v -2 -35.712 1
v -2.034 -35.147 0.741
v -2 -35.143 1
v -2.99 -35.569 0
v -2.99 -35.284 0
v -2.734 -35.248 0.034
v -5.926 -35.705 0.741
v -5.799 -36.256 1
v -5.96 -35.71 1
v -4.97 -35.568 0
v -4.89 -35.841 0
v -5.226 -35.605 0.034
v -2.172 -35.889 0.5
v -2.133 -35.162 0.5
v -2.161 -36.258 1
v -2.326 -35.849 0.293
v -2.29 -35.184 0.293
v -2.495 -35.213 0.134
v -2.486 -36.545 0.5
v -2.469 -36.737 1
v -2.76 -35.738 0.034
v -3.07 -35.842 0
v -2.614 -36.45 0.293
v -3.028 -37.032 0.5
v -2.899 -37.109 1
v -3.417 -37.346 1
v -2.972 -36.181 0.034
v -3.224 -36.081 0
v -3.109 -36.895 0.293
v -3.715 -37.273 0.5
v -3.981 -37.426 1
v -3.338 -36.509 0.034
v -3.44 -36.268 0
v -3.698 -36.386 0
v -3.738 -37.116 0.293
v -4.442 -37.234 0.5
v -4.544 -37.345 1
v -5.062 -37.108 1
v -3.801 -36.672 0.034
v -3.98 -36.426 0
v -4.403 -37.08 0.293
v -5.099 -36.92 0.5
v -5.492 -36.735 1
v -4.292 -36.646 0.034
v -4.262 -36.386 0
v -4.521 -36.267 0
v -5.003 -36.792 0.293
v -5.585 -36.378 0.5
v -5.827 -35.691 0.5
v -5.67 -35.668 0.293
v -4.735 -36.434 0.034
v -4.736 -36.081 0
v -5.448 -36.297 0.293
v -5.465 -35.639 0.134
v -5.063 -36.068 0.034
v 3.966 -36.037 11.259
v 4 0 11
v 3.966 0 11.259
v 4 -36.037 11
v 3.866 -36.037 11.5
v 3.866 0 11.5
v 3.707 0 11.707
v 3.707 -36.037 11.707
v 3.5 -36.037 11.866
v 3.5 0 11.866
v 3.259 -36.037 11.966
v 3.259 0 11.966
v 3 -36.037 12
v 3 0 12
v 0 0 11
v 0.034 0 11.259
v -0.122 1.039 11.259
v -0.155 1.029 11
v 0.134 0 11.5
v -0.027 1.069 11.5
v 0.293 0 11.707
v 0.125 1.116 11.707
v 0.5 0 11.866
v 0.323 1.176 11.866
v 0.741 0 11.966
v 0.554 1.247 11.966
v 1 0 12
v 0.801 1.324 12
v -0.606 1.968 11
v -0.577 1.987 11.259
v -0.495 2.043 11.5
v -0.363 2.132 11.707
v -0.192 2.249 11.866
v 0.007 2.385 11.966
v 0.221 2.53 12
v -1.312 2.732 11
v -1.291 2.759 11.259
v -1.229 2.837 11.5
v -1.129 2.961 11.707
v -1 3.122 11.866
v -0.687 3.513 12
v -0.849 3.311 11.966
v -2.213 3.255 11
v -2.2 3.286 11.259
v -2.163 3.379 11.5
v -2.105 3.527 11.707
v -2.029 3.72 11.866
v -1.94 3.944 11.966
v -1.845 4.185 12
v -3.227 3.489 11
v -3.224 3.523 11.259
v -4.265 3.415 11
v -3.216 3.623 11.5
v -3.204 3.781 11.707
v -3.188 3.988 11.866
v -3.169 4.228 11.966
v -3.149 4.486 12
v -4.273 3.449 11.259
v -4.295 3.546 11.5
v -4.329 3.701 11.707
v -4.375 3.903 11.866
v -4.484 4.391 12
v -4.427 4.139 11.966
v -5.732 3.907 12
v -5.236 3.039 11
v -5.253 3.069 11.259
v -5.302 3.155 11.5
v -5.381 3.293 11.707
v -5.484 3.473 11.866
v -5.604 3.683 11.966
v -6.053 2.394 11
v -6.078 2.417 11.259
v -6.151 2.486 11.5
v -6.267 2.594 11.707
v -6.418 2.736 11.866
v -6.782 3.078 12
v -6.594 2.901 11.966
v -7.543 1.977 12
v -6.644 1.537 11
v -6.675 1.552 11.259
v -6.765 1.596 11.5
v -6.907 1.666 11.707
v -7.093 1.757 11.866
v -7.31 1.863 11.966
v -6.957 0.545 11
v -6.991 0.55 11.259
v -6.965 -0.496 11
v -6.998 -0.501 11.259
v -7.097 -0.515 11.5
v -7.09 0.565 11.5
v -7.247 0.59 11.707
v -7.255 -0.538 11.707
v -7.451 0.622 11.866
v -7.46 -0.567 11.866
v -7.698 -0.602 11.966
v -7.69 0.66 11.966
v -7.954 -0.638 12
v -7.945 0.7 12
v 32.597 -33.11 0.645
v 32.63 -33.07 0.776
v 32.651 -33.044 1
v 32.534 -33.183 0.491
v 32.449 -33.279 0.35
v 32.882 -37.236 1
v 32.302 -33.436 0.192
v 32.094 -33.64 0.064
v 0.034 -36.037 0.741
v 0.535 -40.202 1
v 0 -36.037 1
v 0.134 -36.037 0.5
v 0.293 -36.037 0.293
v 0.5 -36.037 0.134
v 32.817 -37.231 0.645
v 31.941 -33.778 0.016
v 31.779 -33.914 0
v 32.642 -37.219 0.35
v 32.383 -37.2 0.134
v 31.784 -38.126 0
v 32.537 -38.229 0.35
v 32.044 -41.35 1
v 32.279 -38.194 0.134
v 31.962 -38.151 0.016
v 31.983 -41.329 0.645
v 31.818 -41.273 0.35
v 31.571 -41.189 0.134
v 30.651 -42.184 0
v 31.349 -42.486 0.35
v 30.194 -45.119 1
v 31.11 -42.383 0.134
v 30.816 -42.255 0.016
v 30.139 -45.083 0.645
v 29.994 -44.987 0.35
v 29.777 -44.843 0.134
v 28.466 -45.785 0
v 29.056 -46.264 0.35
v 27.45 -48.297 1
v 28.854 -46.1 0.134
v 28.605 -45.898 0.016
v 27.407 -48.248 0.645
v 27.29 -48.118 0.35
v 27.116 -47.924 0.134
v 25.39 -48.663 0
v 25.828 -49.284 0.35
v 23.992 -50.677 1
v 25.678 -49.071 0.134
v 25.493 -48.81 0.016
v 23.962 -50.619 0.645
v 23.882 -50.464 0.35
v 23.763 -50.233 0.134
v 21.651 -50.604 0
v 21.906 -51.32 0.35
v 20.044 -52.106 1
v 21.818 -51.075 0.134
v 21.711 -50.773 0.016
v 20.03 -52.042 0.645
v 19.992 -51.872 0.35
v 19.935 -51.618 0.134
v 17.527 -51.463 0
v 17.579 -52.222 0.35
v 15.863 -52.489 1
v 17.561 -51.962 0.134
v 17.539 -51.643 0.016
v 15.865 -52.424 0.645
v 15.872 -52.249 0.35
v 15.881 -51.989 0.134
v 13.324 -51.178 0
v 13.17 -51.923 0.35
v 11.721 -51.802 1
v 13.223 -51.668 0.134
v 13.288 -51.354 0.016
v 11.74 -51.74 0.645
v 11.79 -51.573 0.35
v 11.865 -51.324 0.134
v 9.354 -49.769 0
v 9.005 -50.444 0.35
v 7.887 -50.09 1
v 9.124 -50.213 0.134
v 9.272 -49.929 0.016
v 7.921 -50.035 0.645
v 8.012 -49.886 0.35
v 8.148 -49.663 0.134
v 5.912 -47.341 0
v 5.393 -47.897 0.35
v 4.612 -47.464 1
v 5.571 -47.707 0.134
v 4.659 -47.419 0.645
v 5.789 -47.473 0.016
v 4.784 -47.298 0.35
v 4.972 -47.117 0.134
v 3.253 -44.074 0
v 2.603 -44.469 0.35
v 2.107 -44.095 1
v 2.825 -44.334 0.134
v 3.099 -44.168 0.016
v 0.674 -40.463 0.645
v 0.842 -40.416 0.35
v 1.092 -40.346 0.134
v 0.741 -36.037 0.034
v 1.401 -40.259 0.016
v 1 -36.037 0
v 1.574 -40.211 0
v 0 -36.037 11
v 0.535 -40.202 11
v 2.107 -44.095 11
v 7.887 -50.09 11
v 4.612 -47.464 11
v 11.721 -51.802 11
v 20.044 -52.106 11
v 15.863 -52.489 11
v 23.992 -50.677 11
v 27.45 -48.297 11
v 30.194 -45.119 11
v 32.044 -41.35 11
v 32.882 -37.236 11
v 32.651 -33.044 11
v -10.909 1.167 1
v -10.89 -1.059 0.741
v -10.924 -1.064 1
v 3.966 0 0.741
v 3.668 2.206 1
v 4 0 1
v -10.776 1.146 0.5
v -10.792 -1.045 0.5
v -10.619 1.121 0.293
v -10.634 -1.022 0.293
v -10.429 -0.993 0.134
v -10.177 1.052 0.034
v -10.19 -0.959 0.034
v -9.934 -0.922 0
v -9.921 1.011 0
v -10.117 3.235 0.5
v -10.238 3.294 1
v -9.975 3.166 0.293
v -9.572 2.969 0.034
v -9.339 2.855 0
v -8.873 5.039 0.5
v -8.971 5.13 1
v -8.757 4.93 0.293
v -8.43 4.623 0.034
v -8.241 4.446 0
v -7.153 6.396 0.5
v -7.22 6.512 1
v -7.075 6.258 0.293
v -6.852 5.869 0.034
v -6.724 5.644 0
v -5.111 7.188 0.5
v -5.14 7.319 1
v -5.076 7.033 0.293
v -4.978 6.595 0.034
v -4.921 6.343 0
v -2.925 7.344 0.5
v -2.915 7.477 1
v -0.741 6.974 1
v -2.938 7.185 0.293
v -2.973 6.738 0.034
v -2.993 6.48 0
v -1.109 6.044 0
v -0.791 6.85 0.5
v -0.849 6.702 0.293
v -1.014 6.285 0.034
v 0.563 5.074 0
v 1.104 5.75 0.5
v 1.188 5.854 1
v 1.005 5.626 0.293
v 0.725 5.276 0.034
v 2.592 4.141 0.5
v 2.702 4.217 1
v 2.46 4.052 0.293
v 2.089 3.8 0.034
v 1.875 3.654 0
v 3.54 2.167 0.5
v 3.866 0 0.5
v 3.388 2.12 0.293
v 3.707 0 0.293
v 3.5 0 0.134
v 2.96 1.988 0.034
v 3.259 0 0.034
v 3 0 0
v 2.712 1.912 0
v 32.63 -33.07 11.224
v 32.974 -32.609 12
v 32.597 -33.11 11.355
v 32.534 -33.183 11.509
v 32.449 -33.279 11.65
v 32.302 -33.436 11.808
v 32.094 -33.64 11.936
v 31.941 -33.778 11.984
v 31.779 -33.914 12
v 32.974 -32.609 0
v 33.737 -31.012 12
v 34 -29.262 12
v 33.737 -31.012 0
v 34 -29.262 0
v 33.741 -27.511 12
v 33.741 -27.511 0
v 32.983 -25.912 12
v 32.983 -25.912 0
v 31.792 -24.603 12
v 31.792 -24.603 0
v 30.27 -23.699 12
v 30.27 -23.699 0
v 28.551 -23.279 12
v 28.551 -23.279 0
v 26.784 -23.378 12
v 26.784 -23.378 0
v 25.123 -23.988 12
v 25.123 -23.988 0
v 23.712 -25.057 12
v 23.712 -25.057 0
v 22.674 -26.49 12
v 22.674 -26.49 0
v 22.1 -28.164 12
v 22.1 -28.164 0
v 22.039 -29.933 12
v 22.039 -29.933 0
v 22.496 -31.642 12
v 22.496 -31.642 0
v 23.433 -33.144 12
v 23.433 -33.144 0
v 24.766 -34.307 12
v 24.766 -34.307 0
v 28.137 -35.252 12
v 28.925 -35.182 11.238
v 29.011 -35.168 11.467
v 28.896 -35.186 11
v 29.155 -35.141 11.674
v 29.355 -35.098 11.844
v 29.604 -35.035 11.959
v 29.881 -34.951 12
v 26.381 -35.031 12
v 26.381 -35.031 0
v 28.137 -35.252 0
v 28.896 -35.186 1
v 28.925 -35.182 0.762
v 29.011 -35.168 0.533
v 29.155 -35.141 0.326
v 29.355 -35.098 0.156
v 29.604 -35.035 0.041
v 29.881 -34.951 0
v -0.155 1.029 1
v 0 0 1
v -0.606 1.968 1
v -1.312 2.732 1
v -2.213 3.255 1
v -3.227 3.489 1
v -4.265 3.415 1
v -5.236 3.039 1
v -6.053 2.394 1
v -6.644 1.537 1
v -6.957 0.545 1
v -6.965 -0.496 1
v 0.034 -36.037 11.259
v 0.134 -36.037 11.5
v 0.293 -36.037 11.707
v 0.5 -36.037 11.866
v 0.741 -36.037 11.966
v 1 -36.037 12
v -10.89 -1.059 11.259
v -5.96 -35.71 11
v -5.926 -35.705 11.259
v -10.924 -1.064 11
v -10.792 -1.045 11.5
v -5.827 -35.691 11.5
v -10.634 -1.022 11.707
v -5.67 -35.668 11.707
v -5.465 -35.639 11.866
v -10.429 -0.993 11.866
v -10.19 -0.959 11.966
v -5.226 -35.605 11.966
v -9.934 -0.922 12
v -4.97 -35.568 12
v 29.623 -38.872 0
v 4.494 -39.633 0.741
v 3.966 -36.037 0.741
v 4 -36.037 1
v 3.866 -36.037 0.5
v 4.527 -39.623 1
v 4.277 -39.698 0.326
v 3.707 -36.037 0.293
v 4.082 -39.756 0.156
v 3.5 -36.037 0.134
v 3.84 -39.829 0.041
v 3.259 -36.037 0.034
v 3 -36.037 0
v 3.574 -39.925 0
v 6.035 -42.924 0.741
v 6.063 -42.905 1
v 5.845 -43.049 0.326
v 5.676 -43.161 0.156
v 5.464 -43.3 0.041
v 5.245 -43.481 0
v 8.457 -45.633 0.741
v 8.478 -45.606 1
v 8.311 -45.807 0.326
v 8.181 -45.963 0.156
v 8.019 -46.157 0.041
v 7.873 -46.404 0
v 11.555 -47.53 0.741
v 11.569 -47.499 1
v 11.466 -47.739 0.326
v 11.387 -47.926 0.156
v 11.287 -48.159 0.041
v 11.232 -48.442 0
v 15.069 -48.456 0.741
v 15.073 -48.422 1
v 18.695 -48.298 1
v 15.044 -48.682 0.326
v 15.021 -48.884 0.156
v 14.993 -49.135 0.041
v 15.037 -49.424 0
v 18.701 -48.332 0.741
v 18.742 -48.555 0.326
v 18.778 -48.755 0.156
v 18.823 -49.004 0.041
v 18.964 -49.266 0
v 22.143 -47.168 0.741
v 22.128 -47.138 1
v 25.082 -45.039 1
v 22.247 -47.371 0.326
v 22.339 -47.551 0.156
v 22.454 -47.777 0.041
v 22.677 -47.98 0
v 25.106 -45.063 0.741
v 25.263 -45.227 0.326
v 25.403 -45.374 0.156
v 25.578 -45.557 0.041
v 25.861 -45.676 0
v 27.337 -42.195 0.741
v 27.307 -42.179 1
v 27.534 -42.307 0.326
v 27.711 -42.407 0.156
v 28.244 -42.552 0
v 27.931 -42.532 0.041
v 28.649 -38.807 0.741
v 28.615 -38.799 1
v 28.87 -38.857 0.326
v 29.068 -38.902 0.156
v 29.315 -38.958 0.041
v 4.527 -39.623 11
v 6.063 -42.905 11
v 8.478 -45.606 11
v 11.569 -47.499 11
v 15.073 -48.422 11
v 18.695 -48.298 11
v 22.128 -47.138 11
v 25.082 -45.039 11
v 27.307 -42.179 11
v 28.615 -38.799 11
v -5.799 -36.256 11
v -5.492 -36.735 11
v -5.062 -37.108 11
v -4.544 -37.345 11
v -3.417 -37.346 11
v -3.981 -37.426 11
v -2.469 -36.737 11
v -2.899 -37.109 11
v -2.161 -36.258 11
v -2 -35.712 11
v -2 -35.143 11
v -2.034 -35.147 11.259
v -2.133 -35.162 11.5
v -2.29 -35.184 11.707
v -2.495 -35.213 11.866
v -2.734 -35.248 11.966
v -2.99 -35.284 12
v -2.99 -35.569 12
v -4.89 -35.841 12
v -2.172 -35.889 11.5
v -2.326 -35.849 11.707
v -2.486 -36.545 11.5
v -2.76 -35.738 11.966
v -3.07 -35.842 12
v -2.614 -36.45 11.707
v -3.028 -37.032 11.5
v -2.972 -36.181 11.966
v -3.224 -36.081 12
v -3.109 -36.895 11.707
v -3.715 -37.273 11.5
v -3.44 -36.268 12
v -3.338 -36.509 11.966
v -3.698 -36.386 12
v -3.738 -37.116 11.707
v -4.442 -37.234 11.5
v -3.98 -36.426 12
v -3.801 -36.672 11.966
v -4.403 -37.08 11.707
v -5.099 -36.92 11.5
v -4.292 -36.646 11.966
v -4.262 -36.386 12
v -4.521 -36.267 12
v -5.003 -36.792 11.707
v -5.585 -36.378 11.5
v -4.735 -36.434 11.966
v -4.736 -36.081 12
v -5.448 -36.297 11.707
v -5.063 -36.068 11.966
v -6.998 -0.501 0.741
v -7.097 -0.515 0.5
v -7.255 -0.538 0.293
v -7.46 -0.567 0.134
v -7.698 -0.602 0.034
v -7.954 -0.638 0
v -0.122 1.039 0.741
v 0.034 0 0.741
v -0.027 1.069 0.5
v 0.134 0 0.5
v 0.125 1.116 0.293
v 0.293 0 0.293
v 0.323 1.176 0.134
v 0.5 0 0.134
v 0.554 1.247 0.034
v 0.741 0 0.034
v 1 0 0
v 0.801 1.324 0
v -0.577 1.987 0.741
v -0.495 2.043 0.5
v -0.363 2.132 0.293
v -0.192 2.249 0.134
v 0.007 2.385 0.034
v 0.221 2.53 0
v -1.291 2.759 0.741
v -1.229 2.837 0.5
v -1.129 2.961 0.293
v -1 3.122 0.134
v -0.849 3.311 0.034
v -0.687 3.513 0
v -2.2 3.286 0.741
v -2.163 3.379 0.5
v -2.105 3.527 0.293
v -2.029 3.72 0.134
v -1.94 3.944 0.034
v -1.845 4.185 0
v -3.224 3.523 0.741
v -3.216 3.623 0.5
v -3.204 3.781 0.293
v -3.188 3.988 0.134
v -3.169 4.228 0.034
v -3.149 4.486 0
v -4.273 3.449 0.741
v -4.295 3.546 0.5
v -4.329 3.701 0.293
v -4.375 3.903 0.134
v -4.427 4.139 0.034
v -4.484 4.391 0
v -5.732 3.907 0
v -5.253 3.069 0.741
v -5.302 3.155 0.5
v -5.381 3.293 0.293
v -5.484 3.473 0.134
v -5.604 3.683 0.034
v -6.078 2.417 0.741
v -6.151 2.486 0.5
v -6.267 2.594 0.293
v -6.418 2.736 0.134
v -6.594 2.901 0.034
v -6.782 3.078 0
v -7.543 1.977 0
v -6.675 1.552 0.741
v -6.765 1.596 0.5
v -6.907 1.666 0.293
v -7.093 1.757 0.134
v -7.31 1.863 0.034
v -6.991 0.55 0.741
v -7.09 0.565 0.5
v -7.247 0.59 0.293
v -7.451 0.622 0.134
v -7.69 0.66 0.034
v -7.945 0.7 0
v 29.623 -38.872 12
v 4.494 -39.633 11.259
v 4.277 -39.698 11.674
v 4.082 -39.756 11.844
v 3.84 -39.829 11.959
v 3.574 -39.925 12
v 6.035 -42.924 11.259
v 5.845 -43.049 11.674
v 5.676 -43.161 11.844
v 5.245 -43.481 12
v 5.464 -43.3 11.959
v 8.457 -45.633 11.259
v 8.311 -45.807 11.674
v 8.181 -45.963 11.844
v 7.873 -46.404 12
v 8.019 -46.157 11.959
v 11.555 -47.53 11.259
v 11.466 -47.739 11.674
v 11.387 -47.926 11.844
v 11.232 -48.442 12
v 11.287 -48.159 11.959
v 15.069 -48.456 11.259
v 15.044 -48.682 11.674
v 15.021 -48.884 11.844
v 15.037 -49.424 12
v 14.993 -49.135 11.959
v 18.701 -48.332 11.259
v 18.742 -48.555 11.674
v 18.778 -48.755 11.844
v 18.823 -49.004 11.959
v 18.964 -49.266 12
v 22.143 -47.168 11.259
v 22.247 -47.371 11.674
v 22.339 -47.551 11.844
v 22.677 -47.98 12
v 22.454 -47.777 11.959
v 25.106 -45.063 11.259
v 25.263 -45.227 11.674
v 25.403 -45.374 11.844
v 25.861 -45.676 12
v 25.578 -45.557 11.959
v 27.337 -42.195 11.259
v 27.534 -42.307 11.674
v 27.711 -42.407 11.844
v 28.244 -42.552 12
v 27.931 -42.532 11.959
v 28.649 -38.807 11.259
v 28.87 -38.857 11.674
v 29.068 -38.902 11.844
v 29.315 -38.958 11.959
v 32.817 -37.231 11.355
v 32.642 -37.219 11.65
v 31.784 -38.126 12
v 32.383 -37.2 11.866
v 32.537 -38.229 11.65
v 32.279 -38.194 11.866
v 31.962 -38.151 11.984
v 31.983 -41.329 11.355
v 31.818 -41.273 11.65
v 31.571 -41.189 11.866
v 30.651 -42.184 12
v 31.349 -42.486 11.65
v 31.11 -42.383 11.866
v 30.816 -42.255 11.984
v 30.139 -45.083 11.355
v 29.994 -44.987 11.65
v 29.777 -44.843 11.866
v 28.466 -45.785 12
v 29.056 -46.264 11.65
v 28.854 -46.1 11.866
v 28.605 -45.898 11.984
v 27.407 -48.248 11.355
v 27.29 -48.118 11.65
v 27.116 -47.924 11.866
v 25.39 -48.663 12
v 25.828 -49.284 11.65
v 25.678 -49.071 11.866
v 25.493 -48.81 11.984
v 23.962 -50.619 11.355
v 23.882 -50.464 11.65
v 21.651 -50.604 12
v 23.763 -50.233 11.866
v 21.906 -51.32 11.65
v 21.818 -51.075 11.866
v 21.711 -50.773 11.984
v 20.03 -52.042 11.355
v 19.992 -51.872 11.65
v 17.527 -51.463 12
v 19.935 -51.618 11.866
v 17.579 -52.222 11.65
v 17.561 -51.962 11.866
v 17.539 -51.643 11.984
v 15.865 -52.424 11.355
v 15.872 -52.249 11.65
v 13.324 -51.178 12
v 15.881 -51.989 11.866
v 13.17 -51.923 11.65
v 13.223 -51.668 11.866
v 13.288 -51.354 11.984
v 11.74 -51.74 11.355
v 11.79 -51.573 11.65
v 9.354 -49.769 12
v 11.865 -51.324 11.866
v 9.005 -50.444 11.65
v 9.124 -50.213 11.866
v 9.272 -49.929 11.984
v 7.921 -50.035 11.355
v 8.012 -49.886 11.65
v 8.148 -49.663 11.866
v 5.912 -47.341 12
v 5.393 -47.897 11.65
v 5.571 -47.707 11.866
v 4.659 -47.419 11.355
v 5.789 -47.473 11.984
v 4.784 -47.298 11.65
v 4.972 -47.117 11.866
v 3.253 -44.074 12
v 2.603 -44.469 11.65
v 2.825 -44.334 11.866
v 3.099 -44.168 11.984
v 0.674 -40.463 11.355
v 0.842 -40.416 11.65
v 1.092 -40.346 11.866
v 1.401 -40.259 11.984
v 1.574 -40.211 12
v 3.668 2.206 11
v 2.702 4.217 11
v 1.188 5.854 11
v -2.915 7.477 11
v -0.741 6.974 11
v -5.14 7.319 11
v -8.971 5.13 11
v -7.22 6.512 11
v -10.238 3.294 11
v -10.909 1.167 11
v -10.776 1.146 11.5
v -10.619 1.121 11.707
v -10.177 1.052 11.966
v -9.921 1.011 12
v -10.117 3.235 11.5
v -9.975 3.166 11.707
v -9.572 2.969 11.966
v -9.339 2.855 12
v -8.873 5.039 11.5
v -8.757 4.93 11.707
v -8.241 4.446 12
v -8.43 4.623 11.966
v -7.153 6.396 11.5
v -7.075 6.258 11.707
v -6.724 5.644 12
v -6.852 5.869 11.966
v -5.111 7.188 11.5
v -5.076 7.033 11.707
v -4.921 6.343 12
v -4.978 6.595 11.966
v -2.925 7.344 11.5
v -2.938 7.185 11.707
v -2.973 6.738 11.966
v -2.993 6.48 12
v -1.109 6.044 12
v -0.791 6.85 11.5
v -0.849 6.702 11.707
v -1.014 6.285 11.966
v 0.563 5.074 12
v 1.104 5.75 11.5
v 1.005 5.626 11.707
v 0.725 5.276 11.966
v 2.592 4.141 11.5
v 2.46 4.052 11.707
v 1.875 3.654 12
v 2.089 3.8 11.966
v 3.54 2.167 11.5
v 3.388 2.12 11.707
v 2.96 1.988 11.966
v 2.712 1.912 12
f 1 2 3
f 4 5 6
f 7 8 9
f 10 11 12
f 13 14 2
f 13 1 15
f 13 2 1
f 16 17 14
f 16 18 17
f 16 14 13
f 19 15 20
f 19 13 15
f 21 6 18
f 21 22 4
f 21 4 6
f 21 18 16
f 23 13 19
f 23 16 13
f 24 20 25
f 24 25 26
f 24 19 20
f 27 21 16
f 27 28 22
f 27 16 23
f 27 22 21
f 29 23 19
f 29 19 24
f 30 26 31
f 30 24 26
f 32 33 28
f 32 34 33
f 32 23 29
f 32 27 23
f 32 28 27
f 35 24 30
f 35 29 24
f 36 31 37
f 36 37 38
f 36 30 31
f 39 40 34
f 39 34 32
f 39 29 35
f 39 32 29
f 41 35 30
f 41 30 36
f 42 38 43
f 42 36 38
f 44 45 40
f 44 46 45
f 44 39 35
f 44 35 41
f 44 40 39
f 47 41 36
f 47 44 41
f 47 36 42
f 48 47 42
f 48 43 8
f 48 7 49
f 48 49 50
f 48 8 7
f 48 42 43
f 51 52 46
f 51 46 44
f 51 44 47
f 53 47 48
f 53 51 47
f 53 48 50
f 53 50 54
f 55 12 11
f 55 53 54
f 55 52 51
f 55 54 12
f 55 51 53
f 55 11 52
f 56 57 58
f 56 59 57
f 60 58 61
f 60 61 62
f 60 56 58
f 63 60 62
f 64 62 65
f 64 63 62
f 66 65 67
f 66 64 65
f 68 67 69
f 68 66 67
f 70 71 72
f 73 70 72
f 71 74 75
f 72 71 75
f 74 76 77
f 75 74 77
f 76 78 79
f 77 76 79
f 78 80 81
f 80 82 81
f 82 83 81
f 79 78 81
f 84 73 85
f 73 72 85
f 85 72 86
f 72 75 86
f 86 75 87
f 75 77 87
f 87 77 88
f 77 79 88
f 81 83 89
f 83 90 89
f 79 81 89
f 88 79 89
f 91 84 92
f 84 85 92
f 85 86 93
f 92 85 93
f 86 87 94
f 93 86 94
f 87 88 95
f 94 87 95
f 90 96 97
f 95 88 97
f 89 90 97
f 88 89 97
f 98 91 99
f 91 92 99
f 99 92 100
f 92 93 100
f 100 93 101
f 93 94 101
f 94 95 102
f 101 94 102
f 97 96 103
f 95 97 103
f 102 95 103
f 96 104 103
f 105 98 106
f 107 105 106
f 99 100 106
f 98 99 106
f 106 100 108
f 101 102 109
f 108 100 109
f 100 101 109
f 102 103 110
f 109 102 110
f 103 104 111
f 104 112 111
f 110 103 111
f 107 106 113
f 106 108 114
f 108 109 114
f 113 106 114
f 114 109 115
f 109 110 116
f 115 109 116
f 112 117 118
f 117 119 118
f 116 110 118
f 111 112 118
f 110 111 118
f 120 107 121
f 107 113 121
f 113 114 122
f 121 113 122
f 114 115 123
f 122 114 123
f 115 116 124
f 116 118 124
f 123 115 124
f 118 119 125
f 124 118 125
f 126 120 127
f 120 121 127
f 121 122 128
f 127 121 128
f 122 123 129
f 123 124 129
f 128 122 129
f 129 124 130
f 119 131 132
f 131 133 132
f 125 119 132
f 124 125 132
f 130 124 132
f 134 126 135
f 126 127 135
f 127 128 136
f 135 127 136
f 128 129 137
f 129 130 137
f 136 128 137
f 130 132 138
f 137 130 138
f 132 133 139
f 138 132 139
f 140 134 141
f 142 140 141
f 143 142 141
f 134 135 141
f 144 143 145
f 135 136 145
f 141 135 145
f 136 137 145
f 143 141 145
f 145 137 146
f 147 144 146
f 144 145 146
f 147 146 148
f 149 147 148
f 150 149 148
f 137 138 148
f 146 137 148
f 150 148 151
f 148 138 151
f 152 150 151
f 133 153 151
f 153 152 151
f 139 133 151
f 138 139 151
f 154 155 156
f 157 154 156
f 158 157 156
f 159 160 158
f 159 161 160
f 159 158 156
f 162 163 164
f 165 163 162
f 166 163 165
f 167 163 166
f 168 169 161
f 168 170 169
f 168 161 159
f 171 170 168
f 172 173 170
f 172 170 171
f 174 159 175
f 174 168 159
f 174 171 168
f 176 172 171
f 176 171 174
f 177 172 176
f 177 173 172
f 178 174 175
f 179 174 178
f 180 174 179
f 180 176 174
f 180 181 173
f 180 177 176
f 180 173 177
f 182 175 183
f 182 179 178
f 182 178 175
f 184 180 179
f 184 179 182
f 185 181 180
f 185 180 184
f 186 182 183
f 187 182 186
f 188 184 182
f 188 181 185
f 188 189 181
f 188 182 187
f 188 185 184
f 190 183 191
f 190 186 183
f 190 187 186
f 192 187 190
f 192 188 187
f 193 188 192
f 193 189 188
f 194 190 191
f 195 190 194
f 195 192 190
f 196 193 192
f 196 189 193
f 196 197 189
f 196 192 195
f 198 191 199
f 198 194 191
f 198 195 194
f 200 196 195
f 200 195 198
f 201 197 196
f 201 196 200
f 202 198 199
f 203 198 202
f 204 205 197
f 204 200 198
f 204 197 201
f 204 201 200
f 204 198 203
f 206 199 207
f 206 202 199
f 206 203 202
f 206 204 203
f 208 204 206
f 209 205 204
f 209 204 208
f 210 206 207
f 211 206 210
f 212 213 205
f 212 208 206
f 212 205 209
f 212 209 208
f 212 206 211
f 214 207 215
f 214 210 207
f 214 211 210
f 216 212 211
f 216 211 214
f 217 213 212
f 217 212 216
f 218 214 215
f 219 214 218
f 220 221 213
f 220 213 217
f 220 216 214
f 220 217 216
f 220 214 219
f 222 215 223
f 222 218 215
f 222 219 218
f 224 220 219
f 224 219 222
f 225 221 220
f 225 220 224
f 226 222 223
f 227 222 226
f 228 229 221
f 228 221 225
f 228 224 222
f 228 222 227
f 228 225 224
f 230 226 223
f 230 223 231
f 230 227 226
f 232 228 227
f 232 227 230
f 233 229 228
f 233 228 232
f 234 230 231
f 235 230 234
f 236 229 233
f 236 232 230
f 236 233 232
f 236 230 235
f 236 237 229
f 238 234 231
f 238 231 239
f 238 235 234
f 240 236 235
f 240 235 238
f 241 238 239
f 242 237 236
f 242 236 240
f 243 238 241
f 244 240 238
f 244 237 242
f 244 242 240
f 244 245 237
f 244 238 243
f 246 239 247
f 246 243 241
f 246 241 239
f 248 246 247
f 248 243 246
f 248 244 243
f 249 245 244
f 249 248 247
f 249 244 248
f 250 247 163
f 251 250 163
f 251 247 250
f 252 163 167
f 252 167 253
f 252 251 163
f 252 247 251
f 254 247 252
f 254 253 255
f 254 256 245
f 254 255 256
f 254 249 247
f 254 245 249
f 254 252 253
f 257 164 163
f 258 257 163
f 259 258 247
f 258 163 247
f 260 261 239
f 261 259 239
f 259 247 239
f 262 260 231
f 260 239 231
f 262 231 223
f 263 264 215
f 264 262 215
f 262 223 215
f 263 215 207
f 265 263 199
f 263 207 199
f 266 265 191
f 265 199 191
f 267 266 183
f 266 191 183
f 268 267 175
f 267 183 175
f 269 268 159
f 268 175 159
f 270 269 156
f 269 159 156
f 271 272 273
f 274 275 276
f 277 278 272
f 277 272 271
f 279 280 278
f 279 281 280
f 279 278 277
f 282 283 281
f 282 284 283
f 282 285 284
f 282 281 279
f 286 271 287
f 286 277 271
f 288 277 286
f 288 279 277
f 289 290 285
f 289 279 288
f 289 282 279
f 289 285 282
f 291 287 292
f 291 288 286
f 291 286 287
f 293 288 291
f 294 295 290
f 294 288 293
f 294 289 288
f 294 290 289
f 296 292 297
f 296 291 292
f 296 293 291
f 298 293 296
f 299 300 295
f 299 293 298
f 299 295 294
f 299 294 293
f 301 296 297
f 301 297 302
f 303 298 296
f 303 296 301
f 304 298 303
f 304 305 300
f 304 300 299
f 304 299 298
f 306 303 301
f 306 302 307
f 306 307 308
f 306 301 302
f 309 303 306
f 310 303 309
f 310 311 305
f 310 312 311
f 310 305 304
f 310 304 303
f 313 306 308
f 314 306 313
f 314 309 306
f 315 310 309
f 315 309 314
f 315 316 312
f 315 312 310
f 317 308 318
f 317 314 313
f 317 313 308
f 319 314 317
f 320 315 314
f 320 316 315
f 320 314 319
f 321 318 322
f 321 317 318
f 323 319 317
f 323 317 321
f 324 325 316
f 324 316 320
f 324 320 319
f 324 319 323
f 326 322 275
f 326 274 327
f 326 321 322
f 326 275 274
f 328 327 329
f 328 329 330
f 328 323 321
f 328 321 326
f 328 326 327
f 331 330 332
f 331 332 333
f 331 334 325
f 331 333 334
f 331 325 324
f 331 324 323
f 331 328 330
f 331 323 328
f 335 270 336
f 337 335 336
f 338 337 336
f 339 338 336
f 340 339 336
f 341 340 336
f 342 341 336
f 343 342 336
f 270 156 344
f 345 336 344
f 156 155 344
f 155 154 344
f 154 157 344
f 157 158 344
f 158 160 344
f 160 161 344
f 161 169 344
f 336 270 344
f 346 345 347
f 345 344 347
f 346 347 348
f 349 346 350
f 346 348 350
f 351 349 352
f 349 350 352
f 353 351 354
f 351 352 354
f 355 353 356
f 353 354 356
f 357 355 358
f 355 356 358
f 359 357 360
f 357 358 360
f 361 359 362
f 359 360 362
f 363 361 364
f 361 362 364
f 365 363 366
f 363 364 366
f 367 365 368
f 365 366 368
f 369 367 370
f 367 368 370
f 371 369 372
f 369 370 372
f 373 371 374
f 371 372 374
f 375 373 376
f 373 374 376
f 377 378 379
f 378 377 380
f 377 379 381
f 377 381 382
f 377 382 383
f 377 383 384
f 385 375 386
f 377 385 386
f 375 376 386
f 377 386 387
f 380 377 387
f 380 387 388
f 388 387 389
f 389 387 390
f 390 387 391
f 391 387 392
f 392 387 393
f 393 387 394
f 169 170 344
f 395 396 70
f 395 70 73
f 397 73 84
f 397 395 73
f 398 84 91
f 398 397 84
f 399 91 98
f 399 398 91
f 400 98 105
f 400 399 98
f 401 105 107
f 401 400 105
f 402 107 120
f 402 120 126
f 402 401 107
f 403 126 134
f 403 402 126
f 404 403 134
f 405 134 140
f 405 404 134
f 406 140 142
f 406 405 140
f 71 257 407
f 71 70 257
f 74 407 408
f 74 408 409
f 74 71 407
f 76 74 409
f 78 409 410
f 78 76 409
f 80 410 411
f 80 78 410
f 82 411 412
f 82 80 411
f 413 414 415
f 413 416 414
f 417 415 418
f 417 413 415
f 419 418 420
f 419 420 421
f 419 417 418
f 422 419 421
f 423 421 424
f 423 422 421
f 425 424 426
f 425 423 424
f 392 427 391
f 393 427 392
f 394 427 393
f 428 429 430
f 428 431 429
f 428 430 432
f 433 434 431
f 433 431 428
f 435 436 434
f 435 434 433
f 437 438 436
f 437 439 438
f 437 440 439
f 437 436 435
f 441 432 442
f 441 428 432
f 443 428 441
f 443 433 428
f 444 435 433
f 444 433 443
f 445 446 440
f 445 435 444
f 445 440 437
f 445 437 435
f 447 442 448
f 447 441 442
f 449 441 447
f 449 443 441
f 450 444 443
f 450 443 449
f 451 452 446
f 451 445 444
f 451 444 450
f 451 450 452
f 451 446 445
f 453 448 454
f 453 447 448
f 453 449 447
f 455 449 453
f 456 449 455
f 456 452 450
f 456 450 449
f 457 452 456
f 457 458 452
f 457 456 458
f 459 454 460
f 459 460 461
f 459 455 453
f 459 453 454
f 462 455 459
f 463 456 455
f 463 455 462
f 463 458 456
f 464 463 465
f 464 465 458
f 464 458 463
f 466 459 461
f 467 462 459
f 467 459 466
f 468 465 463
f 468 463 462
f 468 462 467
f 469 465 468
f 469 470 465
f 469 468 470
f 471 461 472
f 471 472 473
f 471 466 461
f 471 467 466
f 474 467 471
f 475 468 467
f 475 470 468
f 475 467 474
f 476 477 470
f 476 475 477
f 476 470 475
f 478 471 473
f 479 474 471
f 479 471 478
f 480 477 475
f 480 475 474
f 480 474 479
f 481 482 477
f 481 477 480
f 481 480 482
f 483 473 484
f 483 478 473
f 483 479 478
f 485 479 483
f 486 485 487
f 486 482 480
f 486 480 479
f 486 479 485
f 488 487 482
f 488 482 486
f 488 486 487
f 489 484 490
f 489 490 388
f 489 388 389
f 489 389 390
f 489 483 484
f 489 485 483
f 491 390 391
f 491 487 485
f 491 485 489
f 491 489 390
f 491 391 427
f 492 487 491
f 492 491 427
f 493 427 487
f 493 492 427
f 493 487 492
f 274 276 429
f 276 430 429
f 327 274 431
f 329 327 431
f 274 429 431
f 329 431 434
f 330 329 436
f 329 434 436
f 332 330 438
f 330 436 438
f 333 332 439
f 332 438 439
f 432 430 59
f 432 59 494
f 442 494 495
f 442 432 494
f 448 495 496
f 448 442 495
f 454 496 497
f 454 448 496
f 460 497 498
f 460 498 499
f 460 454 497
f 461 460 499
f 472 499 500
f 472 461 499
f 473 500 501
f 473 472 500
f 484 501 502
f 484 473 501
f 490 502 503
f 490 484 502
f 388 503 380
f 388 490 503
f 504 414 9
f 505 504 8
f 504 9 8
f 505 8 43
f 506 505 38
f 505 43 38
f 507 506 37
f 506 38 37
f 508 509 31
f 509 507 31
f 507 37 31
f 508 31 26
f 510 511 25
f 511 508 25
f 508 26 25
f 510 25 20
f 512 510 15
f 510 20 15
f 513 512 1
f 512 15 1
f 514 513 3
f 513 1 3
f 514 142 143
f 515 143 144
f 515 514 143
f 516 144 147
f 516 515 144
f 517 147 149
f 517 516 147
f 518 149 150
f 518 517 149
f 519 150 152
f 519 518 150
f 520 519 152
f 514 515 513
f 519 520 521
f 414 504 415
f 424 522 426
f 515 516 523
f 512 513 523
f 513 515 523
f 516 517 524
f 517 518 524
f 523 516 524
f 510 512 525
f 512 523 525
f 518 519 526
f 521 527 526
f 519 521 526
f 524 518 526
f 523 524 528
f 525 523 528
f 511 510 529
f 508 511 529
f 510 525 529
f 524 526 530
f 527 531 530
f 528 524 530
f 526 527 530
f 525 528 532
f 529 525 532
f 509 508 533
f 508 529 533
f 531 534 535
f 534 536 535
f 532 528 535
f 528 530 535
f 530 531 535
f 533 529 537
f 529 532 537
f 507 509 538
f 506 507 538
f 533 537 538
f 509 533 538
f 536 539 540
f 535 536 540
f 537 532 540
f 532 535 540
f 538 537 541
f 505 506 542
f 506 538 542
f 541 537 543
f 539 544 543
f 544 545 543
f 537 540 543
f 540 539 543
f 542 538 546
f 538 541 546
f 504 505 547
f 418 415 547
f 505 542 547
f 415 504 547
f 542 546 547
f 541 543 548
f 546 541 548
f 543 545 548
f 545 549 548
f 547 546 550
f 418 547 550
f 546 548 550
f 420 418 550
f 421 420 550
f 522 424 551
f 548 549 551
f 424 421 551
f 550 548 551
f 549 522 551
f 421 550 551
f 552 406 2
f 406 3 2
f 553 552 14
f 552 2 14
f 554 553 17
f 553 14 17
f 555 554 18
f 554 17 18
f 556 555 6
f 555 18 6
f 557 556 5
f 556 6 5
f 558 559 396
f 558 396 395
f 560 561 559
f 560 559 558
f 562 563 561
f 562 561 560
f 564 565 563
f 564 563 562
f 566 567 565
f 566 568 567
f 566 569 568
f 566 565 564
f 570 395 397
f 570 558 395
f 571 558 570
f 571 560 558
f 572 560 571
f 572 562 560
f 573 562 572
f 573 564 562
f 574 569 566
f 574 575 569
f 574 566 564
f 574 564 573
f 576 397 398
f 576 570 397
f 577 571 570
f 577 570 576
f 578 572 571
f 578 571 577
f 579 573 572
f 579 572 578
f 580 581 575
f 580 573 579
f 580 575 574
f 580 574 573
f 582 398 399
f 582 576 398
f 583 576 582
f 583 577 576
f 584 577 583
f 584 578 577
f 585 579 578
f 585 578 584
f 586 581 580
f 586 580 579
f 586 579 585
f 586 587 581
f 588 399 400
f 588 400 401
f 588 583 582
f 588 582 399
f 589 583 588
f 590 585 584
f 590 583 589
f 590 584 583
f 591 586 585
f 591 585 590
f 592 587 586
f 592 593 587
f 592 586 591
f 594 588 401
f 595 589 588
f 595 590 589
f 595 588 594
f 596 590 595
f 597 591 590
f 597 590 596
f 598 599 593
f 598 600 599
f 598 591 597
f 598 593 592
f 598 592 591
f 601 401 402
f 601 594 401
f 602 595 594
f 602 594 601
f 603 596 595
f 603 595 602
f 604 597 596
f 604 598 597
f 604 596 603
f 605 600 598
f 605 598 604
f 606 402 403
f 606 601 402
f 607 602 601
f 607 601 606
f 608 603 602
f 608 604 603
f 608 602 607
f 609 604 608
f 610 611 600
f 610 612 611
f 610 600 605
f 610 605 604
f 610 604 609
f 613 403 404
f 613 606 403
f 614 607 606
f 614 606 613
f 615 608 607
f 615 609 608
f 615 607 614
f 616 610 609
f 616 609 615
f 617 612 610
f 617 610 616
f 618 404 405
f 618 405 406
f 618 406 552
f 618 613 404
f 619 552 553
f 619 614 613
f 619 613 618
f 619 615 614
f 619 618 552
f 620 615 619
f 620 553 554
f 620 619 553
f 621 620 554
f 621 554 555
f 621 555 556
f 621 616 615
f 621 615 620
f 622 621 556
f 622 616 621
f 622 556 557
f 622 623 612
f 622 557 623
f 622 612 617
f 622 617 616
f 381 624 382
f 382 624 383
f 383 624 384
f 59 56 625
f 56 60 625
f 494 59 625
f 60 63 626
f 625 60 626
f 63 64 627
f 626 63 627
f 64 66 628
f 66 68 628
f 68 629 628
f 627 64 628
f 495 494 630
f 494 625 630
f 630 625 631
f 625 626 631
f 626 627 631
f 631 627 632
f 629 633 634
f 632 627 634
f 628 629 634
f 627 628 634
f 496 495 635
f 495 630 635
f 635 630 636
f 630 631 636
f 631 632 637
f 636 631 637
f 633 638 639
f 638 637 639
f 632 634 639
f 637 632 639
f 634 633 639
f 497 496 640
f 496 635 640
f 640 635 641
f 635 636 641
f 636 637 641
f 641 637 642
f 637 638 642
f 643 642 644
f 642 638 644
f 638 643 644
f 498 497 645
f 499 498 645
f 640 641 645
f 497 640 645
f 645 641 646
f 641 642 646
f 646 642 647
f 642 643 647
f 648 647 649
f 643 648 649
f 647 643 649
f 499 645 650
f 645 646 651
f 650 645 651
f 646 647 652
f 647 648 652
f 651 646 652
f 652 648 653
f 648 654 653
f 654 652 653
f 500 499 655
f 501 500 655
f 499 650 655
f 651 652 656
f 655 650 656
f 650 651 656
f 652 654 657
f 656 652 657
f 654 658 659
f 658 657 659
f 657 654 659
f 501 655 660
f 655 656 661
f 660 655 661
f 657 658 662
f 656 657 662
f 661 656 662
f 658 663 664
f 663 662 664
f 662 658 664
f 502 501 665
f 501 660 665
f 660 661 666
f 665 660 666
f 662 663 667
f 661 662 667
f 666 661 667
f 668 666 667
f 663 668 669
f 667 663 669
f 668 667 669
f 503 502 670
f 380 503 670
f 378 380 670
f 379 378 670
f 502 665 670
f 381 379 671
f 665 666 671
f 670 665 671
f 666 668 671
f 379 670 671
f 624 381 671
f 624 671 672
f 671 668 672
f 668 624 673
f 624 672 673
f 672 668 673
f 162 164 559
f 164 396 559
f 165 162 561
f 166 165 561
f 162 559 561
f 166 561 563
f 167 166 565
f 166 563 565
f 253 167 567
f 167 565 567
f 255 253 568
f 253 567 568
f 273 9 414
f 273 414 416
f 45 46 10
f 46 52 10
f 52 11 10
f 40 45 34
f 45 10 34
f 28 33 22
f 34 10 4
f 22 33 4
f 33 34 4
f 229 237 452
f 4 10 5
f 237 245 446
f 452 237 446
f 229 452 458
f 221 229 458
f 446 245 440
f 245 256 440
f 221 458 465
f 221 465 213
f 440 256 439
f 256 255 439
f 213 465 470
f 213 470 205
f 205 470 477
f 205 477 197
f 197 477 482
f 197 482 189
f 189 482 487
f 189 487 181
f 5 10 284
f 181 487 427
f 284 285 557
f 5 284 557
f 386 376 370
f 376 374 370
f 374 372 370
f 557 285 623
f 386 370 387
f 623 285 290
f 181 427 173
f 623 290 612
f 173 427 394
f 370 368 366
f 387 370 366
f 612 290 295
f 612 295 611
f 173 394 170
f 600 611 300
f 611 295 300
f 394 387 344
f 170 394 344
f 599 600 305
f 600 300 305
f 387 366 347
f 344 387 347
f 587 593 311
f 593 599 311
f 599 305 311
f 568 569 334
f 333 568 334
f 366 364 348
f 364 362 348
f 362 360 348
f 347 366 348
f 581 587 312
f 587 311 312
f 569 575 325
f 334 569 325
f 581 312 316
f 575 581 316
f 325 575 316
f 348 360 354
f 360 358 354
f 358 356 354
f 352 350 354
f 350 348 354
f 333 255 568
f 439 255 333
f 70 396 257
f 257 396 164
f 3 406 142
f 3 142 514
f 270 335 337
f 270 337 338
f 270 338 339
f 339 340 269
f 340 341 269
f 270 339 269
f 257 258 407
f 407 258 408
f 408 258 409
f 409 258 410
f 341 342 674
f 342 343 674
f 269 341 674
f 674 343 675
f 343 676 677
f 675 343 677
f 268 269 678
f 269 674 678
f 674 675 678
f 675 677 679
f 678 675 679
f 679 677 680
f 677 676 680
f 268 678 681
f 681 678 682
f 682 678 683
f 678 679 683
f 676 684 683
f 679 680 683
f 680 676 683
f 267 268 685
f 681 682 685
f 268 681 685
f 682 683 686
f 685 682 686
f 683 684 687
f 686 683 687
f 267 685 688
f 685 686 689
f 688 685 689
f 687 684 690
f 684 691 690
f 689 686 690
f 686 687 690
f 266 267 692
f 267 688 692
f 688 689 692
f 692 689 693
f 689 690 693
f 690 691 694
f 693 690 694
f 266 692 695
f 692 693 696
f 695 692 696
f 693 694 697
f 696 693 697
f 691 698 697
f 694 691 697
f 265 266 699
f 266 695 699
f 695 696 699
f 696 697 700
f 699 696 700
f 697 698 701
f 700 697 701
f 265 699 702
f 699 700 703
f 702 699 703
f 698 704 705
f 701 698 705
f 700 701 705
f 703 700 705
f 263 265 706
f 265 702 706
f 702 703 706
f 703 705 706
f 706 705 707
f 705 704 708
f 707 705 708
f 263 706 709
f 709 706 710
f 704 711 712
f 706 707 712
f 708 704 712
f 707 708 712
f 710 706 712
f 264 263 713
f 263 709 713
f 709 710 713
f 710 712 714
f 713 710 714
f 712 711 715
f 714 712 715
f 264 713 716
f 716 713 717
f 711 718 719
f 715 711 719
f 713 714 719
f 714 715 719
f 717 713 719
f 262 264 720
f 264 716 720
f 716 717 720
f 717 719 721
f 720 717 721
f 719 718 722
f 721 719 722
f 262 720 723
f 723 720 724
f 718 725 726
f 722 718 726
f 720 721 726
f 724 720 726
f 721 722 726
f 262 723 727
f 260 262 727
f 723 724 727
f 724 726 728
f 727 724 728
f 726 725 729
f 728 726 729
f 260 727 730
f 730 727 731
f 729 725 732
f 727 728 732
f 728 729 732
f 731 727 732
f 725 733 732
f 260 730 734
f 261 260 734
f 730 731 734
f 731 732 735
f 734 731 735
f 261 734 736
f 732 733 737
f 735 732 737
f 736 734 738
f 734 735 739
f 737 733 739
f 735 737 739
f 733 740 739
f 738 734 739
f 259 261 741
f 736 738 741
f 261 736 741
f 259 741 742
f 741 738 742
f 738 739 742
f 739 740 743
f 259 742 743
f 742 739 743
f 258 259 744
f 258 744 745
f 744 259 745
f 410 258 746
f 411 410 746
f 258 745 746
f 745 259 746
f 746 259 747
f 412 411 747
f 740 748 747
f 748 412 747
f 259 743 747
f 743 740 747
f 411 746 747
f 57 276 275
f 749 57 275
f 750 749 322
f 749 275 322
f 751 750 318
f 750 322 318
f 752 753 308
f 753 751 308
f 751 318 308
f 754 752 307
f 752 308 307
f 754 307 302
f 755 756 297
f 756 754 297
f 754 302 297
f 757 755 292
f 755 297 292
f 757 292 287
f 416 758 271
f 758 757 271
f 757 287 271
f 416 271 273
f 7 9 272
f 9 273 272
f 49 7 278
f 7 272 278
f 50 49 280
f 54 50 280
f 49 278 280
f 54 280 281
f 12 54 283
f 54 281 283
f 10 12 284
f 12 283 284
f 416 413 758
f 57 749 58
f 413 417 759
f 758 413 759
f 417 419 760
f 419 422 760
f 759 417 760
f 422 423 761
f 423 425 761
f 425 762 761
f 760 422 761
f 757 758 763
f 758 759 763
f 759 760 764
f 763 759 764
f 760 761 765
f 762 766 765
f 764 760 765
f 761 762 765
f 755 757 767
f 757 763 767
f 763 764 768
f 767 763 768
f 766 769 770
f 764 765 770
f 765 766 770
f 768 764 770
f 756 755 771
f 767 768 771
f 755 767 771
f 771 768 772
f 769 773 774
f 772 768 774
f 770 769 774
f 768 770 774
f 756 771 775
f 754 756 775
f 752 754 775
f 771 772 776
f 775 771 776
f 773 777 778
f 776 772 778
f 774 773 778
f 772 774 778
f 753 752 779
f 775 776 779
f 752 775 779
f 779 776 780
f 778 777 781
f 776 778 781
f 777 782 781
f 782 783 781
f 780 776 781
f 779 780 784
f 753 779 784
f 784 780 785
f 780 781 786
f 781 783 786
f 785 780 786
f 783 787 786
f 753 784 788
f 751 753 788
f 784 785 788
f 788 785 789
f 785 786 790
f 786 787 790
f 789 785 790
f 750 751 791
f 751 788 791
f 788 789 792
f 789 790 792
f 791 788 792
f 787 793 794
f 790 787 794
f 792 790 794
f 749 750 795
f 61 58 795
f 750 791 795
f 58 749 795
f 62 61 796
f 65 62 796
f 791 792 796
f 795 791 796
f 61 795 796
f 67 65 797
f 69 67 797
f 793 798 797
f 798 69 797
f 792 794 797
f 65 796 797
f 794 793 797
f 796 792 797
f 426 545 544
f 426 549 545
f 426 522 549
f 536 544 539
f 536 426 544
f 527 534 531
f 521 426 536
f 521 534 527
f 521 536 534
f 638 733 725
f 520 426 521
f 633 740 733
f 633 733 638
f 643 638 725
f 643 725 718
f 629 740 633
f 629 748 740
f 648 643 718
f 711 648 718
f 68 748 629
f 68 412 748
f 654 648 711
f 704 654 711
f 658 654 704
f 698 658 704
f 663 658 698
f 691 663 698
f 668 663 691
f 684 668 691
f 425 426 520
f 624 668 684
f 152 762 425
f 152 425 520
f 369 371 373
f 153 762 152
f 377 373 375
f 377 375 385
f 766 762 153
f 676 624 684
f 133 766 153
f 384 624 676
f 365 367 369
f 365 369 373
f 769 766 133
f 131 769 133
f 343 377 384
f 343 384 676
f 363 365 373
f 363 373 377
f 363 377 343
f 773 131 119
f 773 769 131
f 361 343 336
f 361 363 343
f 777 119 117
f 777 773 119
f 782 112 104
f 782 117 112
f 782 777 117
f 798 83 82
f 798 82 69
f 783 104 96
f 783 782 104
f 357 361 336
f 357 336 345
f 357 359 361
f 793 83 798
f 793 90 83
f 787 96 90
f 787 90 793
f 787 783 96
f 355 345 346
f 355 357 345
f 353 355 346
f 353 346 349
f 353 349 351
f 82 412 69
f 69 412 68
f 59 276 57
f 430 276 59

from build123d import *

# Parameters (mm, degrees)
PAD_DEPTH   = 12
FILLET_R    = 1
FILLET001_R = 1


with BuildPart() as part:
    # Sketch → Pad (new body)
    with BuildSketch(Plane.XY):
        with BuildLine():
            Line((0, 0), (0, -36.037343))
            ThreePointArc((0, -36.037343), (17.965583, -52.431253), (32.6509, -33.044043))
            ThreePointArc((32.6509, -33.044043), (25.026843, -24.041822), (28.896206, -35.18607))
            ThreePointArc((4, -36.037343), (16.888542, -48.492721), (28.896206, -35.18607))
            Line((4, 0), (4, -36.037343))
            ThreePointArc((4, 0), (-4.033273, 7.481017), (-10.924165, -1.063846))
            Line((-5.959553, -35.709951), (-10.924165, -1.063846))
            ThreePointArc((-5.959553, -35.709951), (-3.696085, -37.406036), (-2, -35.142567))
            Line((-6.964611, -0.496461), (-2, -35.142567))
            ThreePointArc((0, 0), (-3.74886, 3.491141), (-6.964611, -0.496461))
        make_face()
    extrude(amount=PAD_DEPTH)

    # Fillet
    fillet_edges = [part.edges().sort_by_distance(p)[0] for p in [
        (4, -18.018672, 0),
    ]]
    fillet(fillet_edges, radius=FILLET_R)

    # Fillet001
    fillet001_edges = [part.edges().sort_by_distance(p)[0] for p in [
        (4, -18.018672, 12),
    ]]
    fillet(fillet001_edges, radius=FILLET001_R)


solid = part.part
